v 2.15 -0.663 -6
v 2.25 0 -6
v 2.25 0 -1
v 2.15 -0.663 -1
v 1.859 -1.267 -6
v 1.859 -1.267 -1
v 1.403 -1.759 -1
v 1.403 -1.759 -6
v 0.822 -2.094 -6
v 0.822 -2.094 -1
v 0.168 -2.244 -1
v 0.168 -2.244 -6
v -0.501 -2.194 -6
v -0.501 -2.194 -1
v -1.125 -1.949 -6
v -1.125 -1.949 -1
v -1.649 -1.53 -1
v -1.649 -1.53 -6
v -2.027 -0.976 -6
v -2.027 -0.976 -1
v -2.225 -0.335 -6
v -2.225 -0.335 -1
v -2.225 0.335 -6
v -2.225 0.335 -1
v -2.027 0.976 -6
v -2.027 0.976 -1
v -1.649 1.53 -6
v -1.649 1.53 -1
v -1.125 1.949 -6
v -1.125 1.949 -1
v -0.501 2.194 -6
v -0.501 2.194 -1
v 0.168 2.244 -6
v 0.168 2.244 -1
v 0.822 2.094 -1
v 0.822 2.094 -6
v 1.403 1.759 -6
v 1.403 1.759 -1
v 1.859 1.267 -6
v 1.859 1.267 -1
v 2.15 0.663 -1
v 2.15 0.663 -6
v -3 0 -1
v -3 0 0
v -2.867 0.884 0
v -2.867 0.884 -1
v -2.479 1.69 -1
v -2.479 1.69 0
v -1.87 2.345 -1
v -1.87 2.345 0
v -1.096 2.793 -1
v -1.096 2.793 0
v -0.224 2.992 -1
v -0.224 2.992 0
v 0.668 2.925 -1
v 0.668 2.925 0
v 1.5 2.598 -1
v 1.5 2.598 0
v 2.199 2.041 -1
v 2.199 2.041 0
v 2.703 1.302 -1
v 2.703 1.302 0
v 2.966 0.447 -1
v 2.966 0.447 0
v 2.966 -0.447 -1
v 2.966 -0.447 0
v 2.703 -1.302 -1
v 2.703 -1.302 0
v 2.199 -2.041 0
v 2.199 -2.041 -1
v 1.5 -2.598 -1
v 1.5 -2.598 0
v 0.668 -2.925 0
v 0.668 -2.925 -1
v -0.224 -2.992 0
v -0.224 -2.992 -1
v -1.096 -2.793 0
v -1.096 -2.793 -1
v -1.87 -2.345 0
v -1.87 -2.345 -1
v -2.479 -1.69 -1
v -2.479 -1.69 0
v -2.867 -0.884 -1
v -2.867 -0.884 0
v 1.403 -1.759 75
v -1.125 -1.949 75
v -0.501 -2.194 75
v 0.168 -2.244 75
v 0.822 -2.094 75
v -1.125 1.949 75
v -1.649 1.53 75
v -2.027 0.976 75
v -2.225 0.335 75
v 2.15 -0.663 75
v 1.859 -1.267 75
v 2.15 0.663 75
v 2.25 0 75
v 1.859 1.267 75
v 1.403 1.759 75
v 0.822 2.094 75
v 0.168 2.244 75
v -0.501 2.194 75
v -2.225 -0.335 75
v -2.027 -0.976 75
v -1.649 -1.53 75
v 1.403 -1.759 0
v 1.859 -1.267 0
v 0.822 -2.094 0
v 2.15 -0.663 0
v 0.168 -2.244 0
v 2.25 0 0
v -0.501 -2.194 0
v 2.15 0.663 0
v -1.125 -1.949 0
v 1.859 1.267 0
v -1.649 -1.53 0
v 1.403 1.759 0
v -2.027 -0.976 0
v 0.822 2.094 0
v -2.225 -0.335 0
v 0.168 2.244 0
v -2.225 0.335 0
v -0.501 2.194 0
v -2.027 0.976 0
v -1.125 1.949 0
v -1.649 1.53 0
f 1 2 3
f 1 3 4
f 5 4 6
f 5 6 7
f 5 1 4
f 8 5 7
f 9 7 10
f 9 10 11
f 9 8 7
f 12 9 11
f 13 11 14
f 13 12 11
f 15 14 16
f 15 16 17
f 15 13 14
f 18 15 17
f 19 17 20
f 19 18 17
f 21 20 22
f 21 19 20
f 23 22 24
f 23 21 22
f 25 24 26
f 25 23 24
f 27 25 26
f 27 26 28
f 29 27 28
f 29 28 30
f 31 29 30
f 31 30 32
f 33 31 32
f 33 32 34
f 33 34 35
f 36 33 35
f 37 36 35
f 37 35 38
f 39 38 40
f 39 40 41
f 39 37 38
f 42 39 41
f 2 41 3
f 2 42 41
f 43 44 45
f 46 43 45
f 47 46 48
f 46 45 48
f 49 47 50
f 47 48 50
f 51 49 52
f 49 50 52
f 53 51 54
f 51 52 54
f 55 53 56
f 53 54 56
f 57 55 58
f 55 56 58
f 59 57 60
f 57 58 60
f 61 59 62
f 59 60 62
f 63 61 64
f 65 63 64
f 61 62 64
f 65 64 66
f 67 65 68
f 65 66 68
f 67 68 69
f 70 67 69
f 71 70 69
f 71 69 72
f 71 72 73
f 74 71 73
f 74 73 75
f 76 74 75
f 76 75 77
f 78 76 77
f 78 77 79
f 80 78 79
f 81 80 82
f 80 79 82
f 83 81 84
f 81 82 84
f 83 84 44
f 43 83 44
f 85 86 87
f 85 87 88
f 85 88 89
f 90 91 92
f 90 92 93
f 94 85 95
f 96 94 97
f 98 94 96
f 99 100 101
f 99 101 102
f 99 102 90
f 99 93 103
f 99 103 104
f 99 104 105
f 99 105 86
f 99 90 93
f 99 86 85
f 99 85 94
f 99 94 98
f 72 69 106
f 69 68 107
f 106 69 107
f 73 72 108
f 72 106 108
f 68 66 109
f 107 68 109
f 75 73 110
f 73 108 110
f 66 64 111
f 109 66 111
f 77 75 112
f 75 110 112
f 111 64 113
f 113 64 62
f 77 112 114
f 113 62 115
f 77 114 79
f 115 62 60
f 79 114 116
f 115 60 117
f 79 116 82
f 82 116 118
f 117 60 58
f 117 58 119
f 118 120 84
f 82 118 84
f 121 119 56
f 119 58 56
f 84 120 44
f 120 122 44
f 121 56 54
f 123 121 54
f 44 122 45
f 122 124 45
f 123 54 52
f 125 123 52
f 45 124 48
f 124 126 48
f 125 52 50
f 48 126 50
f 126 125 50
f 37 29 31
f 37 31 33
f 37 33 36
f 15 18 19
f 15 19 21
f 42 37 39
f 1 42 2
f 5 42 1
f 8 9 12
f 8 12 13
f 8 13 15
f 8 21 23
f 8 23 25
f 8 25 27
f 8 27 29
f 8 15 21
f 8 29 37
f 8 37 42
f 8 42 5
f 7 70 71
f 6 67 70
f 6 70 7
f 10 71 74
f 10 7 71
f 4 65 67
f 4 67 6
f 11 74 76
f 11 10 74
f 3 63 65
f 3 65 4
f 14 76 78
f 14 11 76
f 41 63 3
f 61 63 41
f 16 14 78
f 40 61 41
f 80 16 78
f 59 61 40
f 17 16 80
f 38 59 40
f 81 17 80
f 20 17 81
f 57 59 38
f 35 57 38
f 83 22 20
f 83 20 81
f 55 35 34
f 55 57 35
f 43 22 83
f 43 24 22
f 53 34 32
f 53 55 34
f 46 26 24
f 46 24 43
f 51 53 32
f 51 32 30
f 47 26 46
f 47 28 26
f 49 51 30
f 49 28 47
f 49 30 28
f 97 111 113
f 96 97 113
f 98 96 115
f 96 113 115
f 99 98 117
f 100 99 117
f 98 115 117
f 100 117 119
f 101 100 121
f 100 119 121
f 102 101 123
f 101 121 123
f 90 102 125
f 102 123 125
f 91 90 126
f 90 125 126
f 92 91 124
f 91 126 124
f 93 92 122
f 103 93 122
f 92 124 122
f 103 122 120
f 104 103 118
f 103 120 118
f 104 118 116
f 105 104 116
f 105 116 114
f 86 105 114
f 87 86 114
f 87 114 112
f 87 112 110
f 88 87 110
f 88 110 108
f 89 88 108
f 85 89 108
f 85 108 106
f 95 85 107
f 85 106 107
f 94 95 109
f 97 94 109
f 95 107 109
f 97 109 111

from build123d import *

# Parameters (mm, degrees)
SKETCH2_R           = 2.25
BOSS_EXTRUDE1_DEPTH = 75
SKETCH3_R           = 3
BOSS_EXTRUDE2_DEPTH = 1
BOSS_EXTRUDE3_START = 5
SKETCH4_R           = 2.25
BOSS_EXTRUDE3_DEPTH = 5


with BuildPart() as part:
    # Sketch2 → Boss-Extrude1 (new body)
    with BuildSketch(Plane.XY):
        Circle(SKETCH2_R)
    extrude(amount=BOSS_EXTRUDE1_DEPTH)

    # Sketch3 → Boss-Extrude2 (add)
    with BuildSketch(Plane(origin=(0, 0, 0), x_dir=(-1, 0, 0), z_dir=(0, 0, -1))):
        Circle(SKETCH3_R)
    extrude(amount=BOSS_EXTRUDE2_DEPTH)

    # Sketch4 → Boss-Extrude3 (add)
    with BuildSketch(Plane(origin=(0, 0, -1), x_dir=(-1, 0, 0), z_dir=(0, 0, -1)).offset(BOSS_EXTRUDE3_START)):
        Circle(SKETCH4_R)
    extrude(amount=-BOSS_EXTRUDE3_DEPTH)


solid = part.part
